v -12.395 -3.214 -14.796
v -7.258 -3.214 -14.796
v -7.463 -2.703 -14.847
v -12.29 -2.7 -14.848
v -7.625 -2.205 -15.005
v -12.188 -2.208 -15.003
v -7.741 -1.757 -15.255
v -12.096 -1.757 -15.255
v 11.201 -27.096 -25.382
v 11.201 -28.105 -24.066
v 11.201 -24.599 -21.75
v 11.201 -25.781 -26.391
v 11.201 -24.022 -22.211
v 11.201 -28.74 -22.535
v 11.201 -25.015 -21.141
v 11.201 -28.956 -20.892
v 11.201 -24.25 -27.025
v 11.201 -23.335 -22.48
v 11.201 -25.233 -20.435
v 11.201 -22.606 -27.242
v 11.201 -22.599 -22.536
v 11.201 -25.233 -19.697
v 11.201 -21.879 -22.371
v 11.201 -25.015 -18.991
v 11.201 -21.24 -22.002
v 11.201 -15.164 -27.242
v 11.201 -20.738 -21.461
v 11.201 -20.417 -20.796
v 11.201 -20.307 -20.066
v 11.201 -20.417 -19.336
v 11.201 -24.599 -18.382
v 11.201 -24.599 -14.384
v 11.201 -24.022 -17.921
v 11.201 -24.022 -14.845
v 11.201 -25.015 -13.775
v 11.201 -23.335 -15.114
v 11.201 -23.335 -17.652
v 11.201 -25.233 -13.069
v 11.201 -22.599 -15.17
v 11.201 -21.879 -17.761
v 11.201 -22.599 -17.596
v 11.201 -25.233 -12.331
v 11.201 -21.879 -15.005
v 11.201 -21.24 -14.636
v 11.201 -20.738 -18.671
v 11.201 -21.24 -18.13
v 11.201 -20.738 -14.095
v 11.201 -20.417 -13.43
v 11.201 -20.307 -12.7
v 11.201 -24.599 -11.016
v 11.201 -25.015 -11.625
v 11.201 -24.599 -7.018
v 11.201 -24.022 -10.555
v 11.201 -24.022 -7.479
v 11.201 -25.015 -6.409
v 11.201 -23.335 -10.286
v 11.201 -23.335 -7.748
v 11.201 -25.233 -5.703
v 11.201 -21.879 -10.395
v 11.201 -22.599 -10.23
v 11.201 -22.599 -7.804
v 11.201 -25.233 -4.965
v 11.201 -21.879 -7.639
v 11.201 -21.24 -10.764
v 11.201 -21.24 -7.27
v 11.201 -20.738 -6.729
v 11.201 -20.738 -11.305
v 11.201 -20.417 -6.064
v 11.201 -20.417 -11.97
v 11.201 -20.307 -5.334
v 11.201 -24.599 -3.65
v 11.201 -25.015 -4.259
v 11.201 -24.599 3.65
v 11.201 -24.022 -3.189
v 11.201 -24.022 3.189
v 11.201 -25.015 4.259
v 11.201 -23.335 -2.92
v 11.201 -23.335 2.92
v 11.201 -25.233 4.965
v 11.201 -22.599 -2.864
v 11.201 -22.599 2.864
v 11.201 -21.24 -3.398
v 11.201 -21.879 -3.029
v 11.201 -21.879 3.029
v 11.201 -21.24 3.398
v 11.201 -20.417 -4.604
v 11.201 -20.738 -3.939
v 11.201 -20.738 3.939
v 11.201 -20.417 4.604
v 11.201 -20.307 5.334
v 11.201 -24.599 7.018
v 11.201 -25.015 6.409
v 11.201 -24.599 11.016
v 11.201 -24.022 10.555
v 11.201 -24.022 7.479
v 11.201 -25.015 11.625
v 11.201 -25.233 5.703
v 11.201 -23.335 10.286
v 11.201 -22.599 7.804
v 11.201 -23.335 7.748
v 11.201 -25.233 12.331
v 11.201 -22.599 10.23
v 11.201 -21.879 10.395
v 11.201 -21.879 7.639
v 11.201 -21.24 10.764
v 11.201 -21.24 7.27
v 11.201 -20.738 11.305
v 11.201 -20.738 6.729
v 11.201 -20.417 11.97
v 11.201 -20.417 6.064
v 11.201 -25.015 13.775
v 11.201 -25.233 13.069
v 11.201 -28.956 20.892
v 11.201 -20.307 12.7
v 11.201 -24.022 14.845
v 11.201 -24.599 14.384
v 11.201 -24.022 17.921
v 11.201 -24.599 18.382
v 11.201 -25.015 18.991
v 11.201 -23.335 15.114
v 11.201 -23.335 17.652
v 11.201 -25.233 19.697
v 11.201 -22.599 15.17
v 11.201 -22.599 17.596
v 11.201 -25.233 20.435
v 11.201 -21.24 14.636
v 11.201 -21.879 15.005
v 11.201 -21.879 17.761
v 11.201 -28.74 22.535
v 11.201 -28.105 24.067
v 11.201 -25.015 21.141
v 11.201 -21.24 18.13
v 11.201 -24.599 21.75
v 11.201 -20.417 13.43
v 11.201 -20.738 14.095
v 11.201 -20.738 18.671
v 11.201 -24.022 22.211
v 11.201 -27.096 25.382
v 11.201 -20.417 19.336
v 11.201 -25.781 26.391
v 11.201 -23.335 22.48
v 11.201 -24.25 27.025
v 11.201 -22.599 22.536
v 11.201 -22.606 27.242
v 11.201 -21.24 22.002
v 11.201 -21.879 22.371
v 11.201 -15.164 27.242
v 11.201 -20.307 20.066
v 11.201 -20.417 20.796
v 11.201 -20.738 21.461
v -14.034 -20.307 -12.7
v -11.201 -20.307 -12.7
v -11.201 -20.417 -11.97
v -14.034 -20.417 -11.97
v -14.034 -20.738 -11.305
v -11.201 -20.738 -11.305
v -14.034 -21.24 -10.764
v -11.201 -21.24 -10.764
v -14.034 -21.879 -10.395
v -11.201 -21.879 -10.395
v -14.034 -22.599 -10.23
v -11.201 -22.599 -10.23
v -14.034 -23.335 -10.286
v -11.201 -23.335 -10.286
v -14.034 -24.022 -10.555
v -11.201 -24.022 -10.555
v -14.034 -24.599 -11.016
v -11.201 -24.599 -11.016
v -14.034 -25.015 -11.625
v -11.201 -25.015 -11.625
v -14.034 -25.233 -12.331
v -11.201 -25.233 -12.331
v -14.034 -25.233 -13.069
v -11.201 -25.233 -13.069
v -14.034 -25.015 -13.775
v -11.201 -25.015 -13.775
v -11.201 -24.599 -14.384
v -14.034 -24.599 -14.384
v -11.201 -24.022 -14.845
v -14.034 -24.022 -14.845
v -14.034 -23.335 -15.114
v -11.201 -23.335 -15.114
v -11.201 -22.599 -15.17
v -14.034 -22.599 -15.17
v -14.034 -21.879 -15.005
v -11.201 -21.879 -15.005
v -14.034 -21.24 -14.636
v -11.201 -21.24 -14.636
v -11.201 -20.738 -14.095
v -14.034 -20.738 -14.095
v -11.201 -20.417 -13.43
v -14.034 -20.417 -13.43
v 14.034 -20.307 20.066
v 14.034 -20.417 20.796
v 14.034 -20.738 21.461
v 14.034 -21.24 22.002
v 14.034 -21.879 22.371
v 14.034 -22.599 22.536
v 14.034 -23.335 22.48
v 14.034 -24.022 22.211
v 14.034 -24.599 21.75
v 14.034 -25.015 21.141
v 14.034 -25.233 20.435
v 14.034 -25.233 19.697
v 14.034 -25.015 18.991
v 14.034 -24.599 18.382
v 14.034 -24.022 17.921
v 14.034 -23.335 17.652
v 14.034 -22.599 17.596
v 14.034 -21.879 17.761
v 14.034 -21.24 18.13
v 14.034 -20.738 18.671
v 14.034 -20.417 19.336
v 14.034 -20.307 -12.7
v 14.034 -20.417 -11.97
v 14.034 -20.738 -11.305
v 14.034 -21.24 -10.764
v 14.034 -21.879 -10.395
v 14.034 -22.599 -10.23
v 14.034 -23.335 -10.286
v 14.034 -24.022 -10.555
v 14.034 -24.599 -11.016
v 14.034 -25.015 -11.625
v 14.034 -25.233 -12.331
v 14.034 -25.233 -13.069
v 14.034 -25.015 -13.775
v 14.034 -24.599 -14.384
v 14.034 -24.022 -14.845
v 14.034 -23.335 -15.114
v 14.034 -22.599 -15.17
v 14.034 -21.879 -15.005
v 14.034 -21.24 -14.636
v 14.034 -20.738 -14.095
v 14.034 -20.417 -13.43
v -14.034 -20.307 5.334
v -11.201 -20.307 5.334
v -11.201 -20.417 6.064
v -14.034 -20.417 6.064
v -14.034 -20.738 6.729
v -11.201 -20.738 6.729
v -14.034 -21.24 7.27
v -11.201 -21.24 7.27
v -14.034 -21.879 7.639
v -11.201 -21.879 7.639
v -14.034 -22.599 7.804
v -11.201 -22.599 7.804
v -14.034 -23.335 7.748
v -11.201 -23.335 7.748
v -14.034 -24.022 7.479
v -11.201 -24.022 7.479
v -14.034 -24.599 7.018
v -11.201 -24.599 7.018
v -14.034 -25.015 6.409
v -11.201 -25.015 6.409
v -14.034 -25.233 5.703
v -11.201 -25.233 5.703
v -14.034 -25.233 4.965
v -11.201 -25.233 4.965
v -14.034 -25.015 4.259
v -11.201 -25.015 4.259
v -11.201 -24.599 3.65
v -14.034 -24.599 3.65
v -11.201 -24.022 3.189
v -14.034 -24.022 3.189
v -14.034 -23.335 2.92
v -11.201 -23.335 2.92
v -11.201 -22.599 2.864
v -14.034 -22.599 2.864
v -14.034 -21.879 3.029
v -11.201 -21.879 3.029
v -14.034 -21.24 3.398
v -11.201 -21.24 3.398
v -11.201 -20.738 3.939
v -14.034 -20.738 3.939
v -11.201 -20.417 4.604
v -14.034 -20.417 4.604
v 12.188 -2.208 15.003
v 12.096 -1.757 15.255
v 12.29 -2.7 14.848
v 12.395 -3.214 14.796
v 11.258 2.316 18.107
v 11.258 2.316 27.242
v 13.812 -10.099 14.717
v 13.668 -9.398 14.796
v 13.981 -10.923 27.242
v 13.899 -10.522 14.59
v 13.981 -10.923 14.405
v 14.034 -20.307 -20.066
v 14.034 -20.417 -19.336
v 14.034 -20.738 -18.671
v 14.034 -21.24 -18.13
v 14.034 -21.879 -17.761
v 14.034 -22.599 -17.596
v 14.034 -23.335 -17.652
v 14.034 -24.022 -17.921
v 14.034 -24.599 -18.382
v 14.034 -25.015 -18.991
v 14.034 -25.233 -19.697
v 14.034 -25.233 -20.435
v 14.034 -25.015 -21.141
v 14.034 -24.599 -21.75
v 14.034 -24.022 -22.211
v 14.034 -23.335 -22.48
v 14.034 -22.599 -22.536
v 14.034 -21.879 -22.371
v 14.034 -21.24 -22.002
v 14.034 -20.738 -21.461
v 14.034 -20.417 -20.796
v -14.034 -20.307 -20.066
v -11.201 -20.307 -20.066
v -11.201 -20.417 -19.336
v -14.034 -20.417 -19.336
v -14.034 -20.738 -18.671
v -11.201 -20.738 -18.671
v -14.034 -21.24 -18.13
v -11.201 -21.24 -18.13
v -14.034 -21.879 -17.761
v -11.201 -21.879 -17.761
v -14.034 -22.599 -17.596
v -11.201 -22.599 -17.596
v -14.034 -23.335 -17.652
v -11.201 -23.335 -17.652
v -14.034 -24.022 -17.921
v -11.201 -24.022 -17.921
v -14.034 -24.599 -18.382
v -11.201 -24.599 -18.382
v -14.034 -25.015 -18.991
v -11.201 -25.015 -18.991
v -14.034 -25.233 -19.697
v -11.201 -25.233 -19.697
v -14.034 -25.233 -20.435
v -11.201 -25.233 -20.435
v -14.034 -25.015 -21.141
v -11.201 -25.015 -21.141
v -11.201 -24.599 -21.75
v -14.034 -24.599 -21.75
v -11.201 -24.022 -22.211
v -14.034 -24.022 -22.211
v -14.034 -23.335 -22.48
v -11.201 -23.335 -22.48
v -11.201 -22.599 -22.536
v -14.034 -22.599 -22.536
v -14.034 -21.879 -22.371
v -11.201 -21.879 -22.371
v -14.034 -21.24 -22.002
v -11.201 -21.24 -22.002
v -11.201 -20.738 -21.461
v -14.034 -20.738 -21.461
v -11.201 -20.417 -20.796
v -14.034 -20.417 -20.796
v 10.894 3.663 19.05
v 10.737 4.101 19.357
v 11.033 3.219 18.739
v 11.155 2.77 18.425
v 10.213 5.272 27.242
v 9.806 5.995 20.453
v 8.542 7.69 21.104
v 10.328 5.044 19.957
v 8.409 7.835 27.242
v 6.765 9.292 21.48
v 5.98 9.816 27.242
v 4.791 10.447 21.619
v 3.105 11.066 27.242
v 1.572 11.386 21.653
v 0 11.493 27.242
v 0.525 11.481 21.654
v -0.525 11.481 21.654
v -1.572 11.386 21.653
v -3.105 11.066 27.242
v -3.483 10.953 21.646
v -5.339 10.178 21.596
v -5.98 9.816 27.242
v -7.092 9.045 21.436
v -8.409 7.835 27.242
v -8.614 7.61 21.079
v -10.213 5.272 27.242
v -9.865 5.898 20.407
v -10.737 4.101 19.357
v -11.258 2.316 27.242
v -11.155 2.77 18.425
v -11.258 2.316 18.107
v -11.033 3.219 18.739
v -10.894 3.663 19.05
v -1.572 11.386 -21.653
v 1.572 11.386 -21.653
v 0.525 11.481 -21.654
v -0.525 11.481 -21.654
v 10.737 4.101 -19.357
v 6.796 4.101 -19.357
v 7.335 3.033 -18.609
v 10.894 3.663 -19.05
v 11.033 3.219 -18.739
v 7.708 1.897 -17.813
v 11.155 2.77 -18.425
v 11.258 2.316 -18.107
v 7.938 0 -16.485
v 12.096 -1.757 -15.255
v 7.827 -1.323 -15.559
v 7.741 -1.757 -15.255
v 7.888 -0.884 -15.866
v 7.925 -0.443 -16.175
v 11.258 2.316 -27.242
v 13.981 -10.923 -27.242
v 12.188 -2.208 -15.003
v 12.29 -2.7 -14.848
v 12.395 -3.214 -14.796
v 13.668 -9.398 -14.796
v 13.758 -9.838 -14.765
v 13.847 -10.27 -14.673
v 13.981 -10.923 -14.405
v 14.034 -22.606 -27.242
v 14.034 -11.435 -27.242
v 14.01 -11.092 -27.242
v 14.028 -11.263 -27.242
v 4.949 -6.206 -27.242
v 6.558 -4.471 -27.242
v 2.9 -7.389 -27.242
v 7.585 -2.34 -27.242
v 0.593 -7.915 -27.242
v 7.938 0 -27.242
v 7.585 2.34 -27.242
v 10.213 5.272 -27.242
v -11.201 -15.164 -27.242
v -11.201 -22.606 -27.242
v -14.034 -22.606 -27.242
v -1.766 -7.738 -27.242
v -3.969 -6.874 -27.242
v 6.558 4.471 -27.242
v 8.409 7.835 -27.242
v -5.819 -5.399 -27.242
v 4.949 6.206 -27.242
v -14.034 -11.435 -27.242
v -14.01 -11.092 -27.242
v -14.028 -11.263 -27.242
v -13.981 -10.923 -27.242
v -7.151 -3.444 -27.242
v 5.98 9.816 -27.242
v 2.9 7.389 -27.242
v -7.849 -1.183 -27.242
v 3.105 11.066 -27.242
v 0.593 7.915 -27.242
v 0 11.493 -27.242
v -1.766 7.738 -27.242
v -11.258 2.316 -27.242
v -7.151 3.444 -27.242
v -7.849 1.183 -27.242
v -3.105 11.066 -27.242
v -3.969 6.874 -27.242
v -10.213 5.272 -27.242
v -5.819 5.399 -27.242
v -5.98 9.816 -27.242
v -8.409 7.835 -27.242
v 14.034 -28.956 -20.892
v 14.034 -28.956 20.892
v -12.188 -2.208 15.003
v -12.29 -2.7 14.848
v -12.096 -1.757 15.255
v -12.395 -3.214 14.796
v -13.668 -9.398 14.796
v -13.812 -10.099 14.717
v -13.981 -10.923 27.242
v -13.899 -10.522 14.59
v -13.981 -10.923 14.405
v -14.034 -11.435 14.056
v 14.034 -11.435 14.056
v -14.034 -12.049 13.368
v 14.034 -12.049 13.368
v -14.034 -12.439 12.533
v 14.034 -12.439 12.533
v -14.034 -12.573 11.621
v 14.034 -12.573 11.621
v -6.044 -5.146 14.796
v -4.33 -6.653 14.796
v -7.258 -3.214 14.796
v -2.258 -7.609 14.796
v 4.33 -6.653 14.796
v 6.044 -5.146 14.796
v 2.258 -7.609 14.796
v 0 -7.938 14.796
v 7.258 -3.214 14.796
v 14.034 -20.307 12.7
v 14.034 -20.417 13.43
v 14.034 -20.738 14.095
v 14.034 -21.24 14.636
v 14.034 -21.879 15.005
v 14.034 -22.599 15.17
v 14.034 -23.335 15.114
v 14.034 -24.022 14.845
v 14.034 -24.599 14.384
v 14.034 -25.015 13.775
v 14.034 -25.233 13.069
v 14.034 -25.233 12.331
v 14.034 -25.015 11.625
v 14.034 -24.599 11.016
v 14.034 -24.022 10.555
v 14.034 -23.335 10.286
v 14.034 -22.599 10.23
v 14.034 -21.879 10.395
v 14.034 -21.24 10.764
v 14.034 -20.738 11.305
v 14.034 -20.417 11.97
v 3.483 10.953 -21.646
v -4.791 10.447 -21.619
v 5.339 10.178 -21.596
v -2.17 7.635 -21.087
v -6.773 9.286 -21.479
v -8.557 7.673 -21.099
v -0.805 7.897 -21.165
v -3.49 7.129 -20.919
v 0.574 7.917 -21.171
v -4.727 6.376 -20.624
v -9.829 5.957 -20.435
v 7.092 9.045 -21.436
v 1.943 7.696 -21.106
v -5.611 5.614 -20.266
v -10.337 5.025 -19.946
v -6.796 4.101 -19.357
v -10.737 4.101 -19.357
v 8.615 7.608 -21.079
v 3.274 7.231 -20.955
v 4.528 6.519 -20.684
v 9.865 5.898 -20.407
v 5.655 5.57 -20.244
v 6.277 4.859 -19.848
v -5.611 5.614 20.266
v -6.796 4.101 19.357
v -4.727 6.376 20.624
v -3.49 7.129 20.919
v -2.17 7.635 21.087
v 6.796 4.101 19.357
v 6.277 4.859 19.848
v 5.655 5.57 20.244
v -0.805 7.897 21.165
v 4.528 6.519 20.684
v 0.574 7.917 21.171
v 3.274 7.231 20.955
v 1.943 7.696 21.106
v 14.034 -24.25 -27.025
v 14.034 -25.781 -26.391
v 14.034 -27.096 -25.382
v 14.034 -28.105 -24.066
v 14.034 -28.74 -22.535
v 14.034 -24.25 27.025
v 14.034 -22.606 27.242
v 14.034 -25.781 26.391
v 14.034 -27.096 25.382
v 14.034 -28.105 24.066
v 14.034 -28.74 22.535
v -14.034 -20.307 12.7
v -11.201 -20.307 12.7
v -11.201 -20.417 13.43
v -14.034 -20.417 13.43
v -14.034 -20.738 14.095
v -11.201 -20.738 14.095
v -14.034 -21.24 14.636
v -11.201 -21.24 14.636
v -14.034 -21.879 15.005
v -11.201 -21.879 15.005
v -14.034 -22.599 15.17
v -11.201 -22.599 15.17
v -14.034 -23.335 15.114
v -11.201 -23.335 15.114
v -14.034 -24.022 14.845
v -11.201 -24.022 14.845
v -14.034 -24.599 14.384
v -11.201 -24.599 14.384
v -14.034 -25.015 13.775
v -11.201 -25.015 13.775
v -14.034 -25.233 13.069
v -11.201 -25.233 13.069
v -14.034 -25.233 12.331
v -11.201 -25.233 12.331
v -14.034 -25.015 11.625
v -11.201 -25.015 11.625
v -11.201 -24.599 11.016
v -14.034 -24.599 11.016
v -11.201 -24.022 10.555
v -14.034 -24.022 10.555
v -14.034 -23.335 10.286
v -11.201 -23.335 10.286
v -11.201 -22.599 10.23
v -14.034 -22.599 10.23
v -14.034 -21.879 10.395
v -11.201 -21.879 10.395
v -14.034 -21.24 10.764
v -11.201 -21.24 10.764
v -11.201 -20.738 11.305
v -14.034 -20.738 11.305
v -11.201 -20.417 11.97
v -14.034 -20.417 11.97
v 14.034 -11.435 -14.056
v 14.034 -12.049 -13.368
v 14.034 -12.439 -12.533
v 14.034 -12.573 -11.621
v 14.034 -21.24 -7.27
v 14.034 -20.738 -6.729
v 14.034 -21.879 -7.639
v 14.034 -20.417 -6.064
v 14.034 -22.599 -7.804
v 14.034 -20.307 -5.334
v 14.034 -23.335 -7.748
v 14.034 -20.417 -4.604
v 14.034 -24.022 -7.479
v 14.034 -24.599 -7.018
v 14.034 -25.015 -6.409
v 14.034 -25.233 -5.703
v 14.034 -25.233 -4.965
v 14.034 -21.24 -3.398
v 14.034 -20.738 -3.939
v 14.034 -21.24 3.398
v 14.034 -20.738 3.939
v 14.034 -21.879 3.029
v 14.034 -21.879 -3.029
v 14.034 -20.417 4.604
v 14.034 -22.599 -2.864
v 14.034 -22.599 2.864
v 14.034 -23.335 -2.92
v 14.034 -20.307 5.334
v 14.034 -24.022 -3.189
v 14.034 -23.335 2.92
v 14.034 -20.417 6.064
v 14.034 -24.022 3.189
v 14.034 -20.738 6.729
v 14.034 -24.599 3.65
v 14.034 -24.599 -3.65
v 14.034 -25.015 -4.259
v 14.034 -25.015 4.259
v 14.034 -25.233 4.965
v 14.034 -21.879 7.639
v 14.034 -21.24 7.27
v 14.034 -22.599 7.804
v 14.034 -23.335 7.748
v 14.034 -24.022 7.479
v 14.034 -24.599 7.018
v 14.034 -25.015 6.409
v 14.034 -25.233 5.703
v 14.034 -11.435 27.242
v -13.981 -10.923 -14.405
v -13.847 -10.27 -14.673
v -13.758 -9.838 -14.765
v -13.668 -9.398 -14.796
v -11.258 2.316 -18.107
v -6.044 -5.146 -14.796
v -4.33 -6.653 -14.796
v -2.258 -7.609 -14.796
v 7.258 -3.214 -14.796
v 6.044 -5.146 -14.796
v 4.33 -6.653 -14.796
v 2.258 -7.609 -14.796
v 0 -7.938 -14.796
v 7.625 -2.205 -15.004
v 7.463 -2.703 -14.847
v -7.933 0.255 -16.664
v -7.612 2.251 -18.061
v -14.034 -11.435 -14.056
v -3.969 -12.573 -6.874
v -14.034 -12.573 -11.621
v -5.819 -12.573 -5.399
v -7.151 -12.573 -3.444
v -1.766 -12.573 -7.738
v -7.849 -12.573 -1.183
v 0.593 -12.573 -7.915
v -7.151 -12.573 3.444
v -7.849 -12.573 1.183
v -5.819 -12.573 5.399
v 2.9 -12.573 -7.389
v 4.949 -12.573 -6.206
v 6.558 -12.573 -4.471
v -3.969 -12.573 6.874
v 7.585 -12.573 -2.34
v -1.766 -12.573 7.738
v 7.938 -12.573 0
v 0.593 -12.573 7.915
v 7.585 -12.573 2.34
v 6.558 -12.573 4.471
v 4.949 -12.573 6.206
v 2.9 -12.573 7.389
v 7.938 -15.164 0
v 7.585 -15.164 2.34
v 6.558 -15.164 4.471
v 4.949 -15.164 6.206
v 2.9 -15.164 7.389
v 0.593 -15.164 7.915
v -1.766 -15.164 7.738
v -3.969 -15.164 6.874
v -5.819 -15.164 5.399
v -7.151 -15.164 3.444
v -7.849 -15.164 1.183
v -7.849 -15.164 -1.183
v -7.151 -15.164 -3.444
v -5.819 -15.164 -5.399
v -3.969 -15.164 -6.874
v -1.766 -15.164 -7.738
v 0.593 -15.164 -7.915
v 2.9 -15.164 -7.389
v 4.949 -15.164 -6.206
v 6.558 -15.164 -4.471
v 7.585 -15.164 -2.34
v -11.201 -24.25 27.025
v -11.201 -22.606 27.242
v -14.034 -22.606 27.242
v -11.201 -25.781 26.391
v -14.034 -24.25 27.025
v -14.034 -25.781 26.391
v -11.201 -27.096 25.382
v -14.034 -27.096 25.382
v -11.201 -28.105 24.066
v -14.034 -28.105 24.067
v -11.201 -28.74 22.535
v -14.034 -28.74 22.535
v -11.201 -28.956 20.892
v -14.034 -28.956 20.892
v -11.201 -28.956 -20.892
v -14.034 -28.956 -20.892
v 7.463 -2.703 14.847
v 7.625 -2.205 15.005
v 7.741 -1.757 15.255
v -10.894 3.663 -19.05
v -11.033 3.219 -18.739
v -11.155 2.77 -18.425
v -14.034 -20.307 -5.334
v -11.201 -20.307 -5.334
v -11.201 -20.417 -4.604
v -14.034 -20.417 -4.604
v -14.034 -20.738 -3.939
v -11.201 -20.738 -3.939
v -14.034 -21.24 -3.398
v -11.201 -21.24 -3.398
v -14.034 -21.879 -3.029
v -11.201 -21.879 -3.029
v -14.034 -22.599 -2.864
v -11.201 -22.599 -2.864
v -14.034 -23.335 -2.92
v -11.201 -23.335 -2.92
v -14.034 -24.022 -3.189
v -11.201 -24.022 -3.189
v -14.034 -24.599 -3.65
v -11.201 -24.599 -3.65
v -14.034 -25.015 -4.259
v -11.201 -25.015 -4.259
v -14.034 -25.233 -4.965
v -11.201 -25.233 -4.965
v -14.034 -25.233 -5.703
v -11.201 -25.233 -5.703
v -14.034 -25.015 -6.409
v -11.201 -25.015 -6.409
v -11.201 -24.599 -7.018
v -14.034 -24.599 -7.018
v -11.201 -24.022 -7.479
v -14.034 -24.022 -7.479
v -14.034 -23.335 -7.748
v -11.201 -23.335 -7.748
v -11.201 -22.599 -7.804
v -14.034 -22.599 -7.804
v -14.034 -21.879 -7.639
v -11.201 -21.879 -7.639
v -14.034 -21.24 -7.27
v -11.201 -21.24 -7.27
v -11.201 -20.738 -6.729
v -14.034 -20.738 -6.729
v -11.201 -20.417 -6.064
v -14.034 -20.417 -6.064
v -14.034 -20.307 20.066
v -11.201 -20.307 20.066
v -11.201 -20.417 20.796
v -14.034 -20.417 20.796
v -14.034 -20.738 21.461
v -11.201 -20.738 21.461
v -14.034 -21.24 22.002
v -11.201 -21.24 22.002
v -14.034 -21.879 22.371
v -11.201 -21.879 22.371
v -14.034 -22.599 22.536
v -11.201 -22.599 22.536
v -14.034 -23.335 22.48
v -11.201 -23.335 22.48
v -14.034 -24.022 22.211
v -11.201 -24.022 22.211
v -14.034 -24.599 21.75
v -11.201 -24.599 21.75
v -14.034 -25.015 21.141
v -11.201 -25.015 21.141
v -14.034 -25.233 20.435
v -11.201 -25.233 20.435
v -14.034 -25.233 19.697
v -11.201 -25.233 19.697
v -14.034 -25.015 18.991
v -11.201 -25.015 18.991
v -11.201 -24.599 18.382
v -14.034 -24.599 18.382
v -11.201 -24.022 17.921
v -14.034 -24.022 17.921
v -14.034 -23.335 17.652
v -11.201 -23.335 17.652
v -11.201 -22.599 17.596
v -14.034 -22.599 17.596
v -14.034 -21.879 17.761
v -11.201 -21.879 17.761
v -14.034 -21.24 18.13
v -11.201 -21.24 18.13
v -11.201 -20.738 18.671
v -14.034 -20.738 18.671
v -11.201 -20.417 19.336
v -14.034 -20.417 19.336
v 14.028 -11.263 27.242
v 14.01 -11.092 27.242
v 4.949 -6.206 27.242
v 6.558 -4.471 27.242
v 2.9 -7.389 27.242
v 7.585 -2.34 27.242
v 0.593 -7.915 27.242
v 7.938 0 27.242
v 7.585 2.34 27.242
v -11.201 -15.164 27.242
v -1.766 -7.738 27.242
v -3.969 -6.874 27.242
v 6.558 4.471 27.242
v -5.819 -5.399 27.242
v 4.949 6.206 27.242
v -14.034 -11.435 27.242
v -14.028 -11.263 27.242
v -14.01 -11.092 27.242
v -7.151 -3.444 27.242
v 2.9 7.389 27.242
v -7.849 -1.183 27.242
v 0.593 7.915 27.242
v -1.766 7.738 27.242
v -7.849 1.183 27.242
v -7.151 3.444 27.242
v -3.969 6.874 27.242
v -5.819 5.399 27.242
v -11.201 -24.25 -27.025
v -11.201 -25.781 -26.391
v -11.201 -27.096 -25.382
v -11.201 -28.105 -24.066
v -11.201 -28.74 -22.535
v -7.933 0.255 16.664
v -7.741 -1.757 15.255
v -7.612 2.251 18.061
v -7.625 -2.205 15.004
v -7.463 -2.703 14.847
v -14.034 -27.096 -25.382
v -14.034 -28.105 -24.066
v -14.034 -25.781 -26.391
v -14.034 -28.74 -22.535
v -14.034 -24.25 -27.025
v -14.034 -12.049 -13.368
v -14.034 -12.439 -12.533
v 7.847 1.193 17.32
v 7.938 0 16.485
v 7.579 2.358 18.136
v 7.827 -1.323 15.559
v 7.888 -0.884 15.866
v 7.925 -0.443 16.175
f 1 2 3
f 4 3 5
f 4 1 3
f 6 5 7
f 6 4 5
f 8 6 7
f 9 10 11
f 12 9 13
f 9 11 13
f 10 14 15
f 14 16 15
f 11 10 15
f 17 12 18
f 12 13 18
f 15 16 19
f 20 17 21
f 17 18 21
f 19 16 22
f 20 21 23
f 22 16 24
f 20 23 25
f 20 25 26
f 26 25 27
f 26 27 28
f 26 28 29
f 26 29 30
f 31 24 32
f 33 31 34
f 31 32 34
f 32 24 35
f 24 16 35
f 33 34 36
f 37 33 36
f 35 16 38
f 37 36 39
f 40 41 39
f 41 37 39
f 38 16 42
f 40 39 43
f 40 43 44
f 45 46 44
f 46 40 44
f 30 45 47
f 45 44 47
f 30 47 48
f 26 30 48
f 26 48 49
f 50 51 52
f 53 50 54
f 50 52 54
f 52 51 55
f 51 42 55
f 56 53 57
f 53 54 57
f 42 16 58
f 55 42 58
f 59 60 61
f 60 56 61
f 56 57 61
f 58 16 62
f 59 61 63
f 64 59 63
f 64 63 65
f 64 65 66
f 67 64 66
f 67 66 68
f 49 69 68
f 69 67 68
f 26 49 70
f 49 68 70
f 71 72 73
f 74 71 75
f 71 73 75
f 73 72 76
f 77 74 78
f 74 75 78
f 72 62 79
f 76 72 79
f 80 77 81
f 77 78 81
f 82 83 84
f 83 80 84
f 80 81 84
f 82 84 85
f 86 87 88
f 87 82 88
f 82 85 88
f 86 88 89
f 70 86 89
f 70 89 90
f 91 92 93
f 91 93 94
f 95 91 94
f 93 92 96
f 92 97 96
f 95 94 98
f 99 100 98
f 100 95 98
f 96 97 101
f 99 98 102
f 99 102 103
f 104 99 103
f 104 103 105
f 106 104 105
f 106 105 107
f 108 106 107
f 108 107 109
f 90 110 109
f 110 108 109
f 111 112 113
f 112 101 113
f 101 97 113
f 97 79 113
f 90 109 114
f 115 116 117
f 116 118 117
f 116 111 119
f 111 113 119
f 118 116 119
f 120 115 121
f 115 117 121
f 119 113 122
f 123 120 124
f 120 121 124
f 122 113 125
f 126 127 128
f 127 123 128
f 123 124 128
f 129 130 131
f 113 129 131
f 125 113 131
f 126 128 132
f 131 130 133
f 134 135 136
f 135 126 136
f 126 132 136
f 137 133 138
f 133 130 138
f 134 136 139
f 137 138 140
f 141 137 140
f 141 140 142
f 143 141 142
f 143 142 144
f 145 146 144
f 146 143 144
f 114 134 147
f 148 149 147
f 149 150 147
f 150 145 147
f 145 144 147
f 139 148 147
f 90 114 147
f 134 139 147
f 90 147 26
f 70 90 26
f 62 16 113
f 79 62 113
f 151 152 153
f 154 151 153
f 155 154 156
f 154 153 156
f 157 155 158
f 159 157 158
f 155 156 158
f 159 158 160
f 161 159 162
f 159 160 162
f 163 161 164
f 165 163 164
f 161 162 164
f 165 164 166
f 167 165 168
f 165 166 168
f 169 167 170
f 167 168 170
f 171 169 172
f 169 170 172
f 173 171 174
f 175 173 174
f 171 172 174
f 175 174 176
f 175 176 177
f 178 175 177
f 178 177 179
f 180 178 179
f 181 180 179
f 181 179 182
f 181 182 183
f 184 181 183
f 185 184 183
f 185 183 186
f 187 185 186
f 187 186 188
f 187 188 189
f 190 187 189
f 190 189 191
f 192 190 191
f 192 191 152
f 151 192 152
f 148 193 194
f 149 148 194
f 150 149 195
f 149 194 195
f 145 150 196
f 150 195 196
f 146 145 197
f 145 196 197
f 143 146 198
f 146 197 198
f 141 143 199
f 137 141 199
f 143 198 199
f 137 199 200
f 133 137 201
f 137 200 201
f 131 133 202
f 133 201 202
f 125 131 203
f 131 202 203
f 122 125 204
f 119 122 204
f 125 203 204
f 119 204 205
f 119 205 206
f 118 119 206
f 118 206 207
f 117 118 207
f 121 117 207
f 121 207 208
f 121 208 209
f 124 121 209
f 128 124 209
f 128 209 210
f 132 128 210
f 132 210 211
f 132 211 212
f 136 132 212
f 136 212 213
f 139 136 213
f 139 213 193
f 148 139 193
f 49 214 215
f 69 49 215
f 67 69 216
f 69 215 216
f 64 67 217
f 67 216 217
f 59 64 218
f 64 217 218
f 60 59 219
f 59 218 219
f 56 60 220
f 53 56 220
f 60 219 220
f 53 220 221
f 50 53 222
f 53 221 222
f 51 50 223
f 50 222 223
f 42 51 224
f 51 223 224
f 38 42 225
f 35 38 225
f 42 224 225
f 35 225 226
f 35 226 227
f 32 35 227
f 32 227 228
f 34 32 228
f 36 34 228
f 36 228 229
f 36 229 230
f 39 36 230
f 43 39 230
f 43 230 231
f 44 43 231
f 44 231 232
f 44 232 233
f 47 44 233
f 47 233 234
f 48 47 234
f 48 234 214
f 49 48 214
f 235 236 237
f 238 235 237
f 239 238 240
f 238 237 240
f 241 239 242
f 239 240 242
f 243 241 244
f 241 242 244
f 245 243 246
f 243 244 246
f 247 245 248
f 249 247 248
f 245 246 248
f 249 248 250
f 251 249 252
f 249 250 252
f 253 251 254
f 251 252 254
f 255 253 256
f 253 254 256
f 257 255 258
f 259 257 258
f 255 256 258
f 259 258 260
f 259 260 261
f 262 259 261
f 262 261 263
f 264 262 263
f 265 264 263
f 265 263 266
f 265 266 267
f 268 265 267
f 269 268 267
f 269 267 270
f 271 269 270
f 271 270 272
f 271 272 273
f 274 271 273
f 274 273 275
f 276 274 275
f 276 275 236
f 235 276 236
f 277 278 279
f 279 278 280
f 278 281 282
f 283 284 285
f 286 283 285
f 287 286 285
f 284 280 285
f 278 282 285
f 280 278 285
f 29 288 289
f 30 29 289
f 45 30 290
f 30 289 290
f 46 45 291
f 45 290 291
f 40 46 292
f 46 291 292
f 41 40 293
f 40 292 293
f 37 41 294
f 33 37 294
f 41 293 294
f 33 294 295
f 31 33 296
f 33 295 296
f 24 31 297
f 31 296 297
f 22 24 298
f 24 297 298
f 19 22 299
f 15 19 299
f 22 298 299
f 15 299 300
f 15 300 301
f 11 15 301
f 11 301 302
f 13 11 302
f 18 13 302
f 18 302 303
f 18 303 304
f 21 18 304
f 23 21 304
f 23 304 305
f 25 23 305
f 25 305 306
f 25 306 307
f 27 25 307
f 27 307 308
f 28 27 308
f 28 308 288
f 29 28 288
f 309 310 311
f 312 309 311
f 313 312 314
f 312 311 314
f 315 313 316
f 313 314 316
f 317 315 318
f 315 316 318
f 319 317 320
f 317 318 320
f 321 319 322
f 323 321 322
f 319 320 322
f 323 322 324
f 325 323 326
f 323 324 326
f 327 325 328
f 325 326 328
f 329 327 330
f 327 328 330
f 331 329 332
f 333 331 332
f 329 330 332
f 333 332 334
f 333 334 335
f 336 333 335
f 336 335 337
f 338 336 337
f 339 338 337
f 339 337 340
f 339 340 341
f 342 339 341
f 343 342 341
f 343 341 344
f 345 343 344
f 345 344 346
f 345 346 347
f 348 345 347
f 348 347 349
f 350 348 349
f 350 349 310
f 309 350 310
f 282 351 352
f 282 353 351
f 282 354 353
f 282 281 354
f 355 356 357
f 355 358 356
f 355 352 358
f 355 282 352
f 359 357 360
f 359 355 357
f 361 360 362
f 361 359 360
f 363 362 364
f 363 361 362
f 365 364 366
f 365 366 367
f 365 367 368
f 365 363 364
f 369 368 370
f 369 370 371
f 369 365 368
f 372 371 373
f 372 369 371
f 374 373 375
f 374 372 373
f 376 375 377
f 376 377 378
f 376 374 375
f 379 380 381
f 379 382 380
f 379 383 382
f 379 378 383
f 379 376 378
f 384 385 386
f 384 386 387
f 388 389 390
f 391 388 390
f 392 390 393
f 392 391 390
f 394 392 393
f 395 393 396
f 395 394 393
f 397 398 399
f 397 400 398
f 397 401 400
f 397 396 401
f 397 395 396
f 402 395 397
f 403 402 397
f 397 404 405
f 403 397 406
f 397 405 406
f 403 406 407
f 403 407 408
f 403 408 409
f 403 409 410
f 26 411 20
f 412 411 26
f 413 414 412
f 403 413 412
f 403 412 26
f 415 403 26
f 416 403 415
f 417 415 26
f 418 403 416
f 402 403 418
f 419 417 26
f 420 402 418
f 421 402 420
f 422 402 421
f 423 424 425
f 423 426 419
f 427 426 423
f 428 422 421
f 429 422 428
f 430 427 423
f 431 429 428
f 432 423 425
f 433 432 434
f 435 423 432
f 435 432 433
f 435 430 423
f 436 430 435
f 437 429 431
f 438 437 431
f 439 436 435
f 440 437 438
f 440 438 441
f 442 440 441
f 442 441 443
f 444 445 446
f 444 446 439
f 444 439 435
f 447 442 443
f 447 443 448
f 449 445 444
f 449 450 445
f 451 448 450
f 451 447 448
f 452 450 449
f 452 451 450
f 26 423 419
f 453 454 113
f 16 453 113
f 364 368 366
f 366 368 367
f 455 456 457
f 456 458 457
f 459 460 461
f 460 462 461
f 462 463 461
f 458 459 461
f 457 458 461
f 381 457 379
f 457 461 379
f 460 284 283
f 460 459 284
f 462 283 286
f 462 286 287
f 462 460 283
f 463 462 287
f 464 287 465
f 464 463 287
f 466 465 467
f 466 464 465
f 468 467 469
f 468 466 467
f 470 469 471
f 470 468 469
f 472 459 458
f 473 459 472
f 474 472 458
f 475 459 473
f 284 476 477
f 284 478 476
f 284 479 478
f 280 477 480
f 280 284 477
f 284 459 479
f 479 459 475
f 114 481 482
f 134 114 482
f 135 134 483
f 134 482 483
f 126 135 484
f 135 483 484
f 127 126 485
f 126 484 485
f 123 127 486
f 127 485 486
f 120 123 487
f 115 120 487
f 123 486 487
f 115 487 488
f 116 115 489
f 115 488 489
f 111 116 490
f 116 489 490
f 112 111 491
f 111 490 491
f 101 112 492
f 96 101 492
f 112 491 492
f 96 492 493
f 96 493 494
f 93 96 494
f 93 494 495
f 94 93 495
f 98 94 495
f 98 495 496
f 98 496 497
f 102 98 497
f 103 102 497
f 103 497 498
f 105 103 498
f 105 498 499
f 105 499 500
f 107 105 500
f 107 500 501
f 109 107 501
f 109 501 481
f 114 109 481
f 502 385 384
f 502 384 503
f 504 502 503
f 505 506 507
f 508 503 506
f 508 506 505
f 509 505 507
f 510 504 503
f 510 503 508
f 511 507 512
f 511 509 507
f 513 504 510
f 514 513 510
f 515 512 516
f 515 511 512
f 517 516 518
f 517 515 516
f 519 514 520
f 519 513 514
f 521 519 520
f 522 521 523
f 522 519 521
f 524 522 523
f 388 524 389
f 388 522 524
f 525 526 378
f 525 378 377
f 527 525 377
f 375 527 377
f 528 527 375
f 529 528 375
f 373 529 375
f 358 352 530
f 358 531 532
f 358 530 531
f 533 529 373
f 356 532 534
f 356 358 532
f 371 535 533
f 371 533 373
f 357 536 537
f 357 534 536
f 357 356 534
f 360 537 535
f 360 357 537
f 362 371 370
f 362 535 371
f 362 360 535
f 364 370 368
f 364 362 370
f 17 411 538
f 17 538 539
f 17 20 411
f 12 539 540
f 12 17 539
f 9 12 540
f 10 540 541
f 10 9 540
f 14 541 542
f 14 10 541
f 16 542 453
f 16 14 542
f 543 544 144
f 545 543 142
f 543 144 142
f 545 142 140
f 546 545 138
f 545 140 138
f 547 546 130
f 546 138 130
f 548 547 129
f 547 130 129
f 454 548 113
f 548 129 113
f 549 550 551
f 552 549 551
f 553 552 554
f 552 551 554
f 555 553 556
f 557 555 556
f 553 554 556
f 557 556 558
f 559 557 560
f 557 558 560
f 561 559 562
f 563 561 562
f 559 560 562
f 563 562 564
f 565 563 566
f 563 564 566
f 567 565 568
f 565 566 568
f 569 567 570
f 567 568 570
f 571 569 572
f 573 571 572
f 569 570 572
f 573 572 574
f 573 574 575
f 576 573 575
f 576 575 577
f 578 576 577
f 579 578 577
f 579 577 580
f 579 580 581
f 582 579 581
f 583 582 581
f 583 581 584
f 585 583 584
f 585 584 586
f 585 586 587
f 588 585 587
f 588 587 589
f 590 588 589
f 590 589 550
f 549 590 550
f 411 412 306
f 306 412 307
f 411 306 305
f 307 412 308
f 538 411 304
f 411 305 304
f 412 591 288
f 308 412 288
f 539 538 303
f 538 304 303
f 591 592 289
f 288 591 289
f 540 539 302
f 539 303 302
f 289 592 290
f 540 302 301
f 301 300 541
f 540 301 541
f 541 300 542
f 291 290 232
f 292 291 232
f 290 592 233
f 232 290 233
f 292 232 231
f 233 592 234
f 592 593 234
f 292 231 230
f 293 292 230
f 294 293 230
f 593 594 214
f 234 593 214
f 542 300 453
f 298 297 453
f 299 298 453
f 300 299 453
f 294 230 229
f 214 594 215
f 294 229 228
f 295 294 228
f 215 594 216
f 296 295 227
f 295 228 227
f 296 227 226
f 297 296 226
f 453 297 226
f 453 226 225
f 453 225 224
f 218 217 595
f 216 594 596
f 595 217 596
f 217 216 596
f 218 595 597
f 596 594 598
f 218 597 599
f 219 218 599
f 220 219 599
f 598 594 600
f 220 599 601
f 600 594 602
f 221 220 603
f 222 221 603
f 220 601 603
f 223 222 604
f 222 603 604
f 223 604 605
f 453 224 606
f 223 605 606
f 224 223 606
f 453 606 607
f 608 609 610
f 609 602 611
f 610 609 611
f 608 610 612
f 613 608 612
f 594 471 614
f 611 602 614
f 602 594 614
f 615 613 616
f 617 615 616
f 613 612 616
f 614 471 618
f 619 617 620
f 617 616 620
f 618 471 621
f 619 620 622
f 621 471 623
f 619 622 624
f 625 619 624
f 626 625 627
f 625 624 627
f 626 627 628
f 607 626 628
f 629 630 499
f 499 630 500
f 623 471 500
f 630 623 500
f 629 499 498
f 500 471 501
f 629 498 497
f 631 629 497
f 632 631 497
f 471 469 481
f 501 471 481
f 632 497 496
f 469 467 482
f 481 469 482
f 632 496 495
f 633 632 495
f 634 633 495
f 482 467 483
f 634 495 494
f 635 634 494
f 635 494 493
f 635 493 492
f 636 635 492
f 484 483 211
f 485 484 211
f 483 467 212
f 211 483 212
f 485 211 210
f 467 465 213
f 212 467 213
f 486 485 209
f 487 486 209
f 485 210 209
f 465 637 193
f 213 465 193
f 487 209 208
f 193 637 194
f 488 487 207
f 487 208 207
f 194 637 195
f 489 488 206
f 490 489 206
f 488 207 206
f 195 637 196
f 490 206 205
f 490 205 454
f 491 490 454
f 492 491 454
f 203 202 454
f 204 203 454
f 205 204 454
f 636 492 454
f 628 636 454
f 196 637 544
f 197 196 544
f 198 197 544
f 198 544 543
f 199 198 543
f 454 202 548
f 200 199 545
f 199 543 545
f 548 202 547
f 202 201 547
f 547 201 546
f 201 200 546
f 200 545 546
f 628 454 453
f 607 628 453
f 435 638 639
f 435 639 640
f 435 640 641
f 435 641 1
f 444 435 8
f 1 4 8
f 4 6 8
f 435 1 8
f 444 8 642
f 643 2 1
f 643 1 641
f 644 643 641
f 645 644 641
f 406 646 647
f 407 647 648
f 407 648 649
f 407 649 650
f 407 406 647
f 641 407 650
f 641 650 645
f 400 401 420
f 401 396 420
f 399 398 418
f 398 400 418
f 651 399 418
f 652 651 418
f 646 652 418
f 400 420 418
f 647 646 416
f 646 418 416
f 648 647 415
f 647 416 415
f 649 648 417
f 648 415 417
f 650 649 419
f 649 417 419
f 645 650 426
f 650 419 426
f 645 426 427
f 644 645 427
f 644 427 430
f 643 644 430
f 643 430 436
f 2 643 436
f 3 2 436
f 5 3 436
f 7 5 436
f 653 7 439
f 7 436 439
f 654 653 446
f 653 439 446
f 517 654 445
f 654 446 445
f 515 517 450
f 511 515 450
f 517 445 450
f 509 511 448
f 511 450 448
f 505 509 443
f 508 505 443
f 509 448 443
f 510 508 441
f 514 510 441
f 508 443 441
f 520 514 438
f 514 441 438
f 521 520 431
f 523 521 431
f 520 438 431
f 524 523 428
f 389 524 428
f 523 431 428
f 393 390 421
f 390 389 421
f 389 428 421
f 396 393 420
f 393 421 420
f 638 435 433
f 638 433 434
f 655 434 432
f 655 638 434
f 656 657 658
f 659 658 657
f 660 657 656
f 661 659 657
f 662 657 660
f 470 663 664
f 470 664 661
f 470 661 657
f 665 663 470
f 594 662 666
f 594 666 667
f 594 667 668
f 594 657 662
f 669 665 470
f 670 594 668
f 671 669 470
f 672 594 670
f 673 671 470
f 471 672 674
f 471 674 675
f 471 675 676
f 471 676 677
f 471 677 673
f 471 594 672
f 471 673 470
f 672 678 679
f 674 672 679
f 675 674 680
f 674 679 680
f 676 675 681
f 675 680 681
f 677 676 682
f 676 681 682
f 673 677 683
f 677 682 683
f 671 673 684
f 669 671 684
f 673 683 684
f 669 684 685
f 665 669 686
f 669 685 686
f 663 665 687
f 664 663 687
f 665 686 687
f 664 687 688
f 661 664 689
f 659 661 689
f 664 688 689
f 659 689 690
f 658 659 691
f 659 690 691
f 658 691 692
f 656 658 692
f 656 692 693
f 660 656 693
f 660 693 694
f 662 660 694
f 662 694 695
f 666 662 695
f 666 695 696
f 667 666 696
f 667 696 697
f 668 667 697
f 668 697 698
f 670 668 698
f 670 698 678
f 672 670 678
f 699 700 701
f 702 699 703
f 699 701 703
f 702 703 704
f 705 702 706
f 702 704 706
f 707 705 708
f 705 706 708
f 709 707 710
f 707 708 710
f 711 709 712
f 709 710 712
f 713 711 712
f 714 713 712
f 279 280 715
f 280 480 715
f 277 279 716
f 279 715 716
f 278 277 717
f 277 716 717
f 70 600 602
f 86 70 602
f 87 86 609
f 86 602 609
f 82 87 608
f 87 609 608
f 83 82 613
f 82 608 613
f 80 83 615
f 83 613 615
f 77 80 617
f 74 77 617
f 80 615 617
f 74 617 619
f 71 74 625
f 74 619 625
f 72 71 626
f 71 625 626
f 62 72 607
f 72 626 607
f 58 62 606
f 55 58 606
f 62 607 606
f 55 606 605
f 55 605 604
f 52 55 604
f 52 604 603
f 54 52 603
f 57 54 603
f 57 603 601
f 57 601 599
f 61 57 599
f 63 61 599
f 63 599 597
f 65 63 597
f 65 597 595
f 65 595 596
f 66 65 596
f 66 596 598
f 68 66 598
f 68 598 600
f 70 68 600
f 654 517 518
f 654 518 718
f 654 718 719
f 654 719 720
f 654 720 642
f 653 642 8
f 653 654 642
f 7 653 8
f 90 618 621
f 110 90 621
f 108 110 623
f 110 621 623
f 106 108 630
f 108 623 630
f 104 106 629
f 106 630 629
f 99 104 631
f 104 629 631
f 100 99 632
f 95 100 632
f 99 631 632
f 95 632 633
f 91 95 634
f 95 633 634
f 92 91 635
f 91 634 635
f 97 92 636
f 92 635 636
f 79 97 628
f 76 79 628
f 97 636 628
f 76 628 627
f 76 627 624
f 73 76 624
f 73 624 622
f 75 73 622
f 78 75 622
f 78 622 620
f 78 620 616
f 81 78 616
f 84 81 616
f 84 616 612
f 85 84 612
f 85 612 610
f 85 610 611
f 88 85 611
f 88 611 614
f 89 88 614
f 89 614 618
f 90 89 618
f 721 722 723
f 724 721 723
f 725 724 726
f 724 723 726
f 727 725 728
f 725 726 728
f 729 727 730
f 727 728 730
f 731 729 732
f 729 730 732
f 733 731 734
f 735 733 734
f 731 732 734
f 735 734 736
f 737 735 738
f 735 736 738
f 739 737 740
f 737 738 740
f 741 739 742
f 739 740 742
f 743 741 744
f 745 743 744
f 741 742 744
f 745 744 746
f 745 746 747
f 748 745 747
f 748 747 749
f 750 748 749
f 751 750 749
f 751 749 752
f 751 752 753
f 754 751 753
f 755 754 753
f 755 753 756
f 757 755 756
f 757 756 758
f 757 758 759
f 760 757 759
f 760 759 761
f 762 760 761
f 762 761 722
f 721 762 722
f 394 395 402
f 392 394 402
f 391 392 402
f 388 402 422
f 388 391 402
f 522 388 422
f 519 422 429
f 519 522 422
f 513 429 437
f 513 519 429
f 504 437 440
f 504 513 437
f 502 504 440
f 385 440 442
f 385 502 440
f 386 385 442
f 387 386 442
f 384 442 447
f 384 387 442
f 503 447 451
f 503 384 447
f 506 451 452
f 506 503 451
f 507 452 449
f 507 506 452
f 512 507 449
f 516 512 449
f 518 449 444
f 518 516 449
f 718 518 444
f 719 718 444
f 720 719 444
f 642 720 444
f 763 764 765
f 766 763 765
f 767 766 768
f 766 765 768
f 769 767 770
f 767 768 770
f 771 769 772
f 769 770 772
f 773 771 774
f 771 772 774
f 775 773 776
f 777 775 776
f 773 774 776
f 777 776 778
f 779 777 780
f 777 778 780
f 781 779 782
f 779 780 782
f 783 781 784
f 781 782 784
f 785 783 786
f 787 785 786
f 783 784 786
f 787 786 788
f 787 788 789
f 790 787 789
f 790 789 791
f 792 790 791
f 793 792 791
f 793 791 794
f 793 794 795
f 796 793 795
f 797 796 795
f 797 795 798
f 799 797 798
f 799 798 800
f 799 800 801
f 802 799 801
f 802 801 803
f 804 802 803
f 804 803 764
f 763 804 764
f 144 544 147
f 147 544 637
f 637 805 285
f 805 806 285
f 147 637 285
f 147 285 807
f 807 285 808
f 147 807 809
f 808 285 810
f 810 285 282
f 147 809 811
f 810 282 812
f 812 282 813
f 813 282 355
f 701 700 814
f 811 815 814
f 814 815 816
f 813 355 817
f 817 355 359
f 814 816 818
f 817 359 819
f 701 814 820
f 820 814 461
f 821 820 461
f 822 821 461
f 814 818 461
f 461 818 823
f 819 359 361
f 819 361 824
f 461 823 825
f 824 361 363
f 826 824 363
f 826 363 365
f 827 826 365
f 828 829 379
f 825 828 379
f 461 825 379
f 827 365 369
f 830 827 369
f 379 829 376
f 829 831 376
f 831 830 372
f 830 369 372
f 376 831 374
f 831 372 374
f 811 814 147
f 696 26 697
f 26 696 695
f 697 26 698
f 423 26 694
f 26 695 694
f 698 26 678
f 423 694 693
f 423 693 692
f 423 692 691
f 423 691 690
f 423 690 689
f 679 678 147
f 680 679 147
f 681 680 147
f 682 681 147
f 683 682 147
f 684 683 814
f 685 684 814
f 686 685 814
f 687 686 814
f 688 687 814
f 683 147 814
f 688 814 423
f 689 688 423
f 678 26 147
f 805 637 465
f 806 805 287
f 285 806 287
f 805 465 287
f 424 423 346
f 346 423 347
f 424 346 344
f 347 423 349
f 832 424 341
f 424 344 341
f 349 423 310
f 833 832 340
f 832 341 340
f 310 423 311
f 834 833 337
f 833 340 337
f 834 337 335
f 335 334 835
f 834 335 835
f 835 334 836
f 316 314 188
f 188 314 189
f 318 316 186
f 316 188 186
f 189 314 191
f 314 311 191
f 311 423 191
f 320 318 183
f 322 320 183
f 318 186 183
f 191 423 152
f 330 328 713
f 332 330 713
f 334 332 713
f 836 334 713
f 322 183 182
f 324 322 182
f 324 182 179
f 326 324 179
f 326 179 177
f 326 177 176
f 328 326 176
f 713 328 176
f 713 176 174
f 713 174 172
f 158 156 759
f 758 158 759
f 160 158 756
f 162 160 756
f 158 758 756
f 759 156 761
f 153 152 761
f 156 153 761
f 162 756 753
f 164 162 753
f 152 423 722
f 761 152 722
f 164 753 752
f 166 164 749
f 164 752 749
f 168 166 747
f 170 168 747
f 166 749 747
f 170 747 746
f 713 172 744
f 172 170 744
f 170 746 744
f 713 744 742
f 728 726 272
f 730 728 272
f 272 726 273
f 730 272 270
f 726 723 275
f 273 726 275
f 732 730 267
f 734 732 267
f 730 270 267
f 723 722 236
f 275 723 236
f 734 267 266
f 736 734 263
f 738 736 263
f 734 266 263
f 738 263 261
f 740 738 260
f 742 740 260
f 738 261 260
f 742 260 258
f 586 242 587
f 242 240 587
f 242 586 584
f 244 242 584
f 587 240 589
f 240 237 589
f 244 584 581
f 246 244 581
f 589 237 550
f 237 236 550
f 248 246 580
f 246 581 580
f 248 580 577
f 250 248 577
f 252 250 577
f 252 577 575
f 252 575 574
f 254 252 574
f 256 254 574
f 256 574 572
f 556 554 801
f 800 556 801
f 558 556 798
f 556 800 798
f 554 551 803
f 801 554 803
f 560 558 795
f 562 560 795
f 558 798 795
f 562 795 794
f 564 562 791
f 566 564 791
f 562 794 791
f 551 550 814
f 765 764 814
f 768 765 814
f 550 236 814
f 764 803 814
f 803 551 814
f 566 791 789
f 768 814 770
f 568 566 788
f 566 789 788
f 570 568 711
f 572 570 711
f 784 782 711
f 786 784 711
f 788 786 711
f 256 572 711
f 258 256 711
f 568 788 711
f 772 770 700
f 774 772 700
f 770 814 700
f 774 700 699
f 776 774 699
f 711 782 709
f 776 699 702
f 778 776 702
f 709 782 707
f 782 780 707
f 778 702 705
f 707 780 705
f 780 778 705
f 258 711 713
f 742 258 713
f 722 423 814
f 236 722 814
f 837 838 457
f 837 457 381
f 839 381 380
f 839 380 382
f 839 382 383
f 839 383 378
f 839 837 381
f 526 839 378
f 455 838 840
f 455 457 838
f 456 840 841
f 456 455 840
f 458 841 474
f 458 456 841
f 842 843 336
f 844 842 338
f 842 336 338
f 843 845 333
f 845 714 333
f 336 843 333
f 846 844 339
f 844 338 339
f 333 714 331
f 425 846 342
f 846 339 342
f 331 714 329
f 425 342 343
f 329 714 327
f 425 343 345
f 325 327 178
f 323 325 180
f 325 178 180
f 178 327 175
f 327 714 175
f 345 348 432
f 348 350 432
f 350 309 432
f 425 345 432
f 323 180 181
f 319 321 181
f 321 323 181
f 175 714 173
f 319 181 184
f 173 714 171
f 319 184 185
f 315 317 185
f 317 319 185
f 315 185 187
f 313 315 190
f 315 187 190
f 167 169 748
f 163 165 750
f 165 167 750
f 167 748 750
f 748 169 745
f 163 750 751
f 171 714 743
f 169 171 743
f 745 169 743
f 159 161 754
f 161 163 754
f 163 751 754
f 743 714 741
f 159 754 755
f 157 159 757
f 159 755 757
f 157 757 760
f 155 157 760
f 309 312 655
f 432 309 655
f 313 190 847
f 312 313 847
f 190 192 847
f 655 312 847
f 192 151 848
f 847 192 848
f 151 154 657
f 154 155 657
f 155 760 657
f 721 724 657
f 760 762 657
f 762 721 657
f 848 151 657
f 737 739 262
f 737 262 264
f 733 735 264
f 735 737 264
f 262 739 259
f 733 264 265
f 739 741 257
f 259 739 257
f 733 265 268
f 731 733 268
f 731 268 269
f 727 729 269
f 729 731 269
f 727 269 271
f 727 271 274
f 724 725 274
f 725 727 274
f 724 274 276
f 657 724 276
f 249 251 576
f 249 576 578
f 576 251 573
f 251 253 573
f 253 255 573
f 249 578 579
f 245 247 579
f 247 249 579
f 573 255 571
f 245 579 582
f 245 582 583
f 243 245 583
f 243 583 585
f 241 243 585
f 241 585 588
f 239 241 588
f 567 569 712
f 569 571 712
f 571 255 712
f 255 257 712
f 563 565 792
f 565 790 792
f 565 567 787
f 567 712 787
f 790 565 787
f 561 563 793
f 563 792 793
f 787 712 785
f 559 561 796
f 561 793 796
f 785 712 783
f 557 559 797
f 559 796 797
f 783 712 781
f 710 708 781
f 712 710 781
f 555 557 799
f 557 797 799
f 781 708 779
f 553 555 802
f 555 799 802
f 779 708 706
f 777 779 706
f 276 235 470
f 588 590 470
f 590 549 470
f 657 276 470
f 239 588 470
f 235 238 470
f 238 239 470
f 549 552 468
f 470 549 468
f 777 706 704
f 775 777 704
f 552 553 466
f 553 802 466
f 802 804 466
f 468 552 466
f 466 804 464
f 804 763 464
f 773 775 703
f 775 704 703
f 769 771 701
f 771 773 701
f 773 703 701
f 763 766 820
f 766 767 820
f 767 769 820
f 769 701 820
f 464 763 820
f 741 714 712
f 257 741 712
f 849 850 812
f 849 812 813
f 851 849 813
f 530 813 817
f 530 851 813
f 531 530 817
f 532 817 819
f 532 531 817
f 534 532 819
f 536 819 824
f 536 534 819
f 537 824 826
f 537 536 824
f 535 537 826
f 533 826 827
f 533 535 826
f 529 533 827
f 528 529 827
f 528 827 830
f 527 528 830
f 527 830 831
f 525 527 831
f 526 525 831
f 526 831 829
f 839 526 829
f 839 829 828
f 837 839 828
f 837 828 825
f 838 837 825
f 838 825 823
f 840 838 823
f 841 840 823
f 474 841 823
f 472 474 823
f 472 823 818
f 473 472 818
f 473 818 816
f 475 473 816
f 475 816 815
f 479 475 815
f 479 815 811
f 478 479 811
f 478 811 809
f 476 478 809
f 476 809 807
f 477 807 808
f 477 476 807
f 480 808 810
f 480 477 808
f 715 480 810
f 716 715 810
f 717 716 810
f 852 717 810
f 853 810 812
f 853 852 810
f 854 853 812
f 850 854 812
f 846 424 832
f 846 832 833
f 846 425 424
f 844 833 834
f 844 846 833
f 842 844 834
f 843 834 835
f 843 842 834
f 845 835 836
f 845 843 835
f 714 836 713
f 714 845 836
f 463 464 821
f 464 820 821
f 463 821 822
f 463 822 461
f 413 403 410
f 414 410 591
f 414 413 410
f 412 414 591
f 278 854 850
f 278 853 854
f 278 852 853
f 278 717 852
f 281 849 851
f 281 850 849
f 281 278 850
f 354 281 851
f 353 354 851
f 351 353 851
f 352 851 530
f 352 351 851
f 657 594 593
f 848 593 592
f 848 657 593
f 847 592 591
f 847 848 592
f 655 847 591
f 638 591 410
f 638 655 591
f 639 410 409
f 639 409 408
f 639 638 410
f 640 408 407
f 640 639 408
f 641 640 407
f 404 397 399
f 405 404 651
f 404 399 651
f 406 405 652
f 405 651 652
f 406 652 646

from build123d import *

# Parameters (mm, degrees)
SKETCH1_R           = 7.9375
BOSS_EXTRUDE1_DEPTH = 27.2415
SKETCH2_R           = 2.4765
CUT_EXTRUDE1_DEPTH  = 49.665241675
CUT_EXTRUDE2_DEPTH  = 49.665241675
SKETCH4_R           = 7.9375
CUT_EXTRUDE3_DEPTH  = 41.615884673
FILLET1_R           = 6.35
FILLET2_R           = 3.175
FILLET3_R           = 12.7
FILLET4_R           = 2.54
FILLET5_R           = 2.54


with BuildPart() as part:
    # Sketch1 → Boss-Extrude1 (new, symmetric)
    with BuildSketch(Plane.XY):
        with BuildLine():
            Line((11.25771962, 2.316093955), (14.0335, -11.176))
            Line((14.0335, -11.176), (14.0335, -28.956))
            Line((14.0335, -28.956), (11.2014, -28.956))
            Line((11.2014, -28.956), (11.2014, -15.1638))
            Line((11.2014, -15.1638), (-11.2014, -15.1638))
            Line((-11.2014, -15.1638), (-11.2014, -28.956))
            Line((-11.2014, -28.956), (-14.0335, -28.956))
            Line((-14.0335, -28.956), (-14.0335, -11.176))
            Line((-14.0335, -11.176), (-11.25771962, 2.316093955))
            ThreePointArc((-11.25771962, 2.316093955), (0, 11.4935), (11.25771962, 2.316093955))
        make_face()
        Circle(SKETCH1_R, mode=Mode.SUBTRACT)
    extrude(amount=BOSS_EXTRUDE1_DEPTH, both=True)

    # Sketch2 → Cut-Extrude1 (cut, through all)
    with BuildSketch(Plane(origin=(14.0335, 0, 0), x_dir=(0, 0, -1), z_dir=(1, 0, 0))):
        with Locations(Location((-20.066, -22.7838, 0), (0, 0, 90))):
            Circle(SKETCH2_R)
        with Locations(Location((-12.7, -22.7838, 0), (0, 0, 90))):
            Circle(SKETCH2_R)
        with Locations(Location((-5.334, -22.7838, 0), (0, 0, 90))):
            Circle(SKETCH2_R)
        with Locations(Location((5.334, -22.7838, 0), (0, 0, 90))):
            Circle(SKETCH2_R)
        with Locations(Location((12.7, -22.7838, 0), (0, 0, 90))):
            Circle(SKETCH2_R)
        with Locations(Location((20.066, -22.7838, 0), (0, 0, 90))):
            Circle(SKETCH2_R)
    extrude(amount=-CUT_EXTRUDE1_DEPTH, mode=Mode.SUBTRACT)

    # Sketch3 → Cut-Extrude2 (cut, through all)
    with BuildSketch(Plane(origin=(14.0335, 0, 0), x_dir=(0, 0, -1), z_dir=(1, 0, 0))):
        Polygon((14.7955, -12.573), (-14.7955, -12.573), (-14.7955, -2.413), (-21.6535, 7.38123903), (-21.6535, 11.4935), (21.6535, 11.4935), (21.6535, 7.38123903), (14.7955, -2.413), align=None)
    extrude(amount=-CUT_EXTRUDE2_DEPTH, mode=Mode.SUBTRACT)

    # Sketch4 → Cut-Extrude3 (cut, through all)
    with BuildSketch(Plane.XZ.offset(15.1638)):
        Circle(SKETCH4_R)
    extrude(amount=-CUT_EXTRUDE3_DEPTH, mode=Mode.SUBTRACT)

    # Fillet1
    fillet1_edges = [part.edges().sort_by_distance(p)[0] for p in [
        (12.61745, -28.956, -27.2415),
        (-12.61745, -28.956, -27.2415),
        (-12.61745, -28.956, 27.2415),
        (12.61745, -28.956, 27.2415),
    ]]
    fillet(fillet1_edges, radius=FILLET1_R)

    # Fillet2
    fillet2_edges = [part.edges().sort_by_distance(p)[0] for p in [
        (0, -12.573, 14.7955),
        (0, -12.573, -14.7955),
    ]]
    fillet(fillet2_edges, radius=FILLET2_R)

    # Fillet3
    # the kernel refuses this fillet: 12.7 mm, written as the material it adds along each edge
    with BuildSketch(Plane(origin=(18.820836014, 7.38123903, 21.6535), x_dir=(0, -0.8191520442889931, -0.5735764363510439), z_dir=(-1, 0, 0))) as fillet3_piece_1_section:
        with BuildLine():
            CenterArc((FILLET3_R * 0.315298788879, -FILLET3_R), FILLET3_R, 90, 35)
            Line((-FILLET3_R * 0.258277647472, -FILLET3_R * 0.180847955711), (0, 0))
            Line((0, 0), (FILLET3_R * 0.315298788879, 0))
        make_face()
    fillet3_piece_1 = extrude(amount=25.91246026, mode=Mode.PRIVATE)
    fillet3_piece_1 = fillet3_piece_1 & Plane(origin=(0, 0, 21.359418529), x_dir=(-0.9794857632595162, 0.20151337318382392, 0), z_dir=(0, 0, 1)) * Cylinder(11.4935, 68, mode=Mode.PRIVATE)
    fillet3_piece_1 = fillet3_piece_1 - Plane(origin=(0, 0, 21.359418529), x_dir=(1, 0, 0), z_dir=(0, 0, -1)) * Cylinder(7.9375, 68, mode=Mode.PRIVATE)
    add(fillet3_piece_1)
    with BuildSketch(Plane(origin=(7.091624245, 7.38123903, 21.6535), x_dir=(0, -0.8191520442889934, -0.5735764363510438), z_dir=(-1, 0, 0))) as fillet3_piece_2_section:
        with BuildLine():
            CenterArc((FILLET3_R * 0.315298788879, -FILLET3_R), FILLET3_R, 90, 35)
            Line((-FILLET3_R * 0.258277647472, -FILLET3_R * 0.180847955711), (0, 0))
            Line((0, 0), (FILLET3_R * 0.315298788879, 0))
        make_face()
    fillet3_piece_2 = extrude(amount=25.91246026, mode=Mode.PRIVATE)
    fillet3_piece_2 = fillet3_piece_2 & Plane(origin=(0, 0, 21.359421055), x_dir=(-0.9794857632595162, 0.20151337318382392, 0), z_dir=(0, 0, 1)) * Cylinder(11.4935, 68, mode=Mode.PRIVATE)
    fillet3_piece_2 = fillet3_piece_2 - Plane(origin=(0, 0, 21.359421055), x_dir=(1, 0, 0), z_dir=(0, 0, -1)) * Cylinder(7.9375, 68, mode=Mode.PRIVATE)
    add(fillet3_piece_2)
    with BuildSketch(Plane(origin=(7.091624245, 7.38123903, -21.6535), x_dir=(0, -0.819152044288993, 0.5735764363510443), z_dir=(-1, 0, 0))) as fillet3_piece_3_section:
        with BuildLine():
            CenterArc((FILLET3_R * 0.315298788879, FILLET3_R), FILLET3_R, 235, 35)
            Line((-FILLET3_R * 0.258277647472, FILLET3_R * 0.180847955711), (0, 0))
            Line((0, 0), (FILLET3_R * 0.315298788879, 0))
        make_face()
    fillet3_piece_3 = extrude(amount=25.91246026, mode=Mode.PRIVATE)
    fillet3_piece_3 = fillet3_piece_3 - Plane(origin=(0, 0, -21.359421055), x_dir=(1, 0, 0), z_dir=(0, 0, -1)) * Cylinder(7.9375, 68, mode=Mode.PRIVATE)
    fillet3_piece_3 = fillet3_piece_3 & Plane(origin=(0, 0, -21.359421055), x_dir=(-0.9794857632595162, 0.20151337318382392, 0), z_dir=(0, 0, 1)) * Cylinder(11.4935, 68, mode=Mode.PRIVATE)
    add(fillet3_piece_3)
    with BuildSketch(Plane(origin=(18.820836014, 7.38123903, -21.6535), x_dir=(0, -0.8191520442889931, 0.5735764363510439), z_dir=(-1, 0, 0))) as fillet3_piece_4_section:
        with BuildLine():
            CenterArc((FILLET3_R * 0.315298788879, FILLET3_R), FILLET3_R, 235, 35)
            Line((-FILLET3_R * 0.258277647472, FILLET3_R * 0.180847955711), (0, 0))
            Line((0, 0), (FILLET3_R * 0.315298788879, 0))
        make_face()
    fillet3_piece_4 = extrude(amount=25.91246026, mode=Mode.PRIVATE)
    fillet3_piece_4 = fillet3_piece_4 & Plane(origin=(0, 0, -21.359418529), x_dir=(-0.9794857632595162, 0.20151337318382392, 0), z_dir=(0, 0, 1)) * Cylinder(11.4935, 68, mode=Mode.PRIVATE)
    fillet3_piece_4 = fillet3_piece_4 - Plane(origin=(0, 0, -21.359418529), x_dir=(1, 0, 0), z_dir=(0, 0, -1)) * Cylinder(7.9375, 68, mode=Mode.PRIVATE)
    add(fillet3_piece_4)

    # Fillet4
    fillet4_edges = [part.edges().sort_by_distance(p)[0] for p in [
        (9.89624428, -2.413, -14.7955),
        (-9.89624428, -2.413, -14.7955),
        (-9.89624428, -2.413, 14.7955),
        (9.89624428, -2.413, 14.7955),
    ]]
    fillet(fillet4_edges, radius=FILLET4_R)

    # Fillet5
    fillet5_edges = [part.edges().sort_by_distance(p)[0] for p in [
        (-14.0335, -11.176, 20.746232014),
        (-14.0335, -11.176, -20.746232014),
        (14.0335, -11.176, -20.746232014),
        (14.0335, -11.176, 20.746232014),
    ]]
    fillet(fillet5_edges, radius=FILLET5_R)


solid = part.part
